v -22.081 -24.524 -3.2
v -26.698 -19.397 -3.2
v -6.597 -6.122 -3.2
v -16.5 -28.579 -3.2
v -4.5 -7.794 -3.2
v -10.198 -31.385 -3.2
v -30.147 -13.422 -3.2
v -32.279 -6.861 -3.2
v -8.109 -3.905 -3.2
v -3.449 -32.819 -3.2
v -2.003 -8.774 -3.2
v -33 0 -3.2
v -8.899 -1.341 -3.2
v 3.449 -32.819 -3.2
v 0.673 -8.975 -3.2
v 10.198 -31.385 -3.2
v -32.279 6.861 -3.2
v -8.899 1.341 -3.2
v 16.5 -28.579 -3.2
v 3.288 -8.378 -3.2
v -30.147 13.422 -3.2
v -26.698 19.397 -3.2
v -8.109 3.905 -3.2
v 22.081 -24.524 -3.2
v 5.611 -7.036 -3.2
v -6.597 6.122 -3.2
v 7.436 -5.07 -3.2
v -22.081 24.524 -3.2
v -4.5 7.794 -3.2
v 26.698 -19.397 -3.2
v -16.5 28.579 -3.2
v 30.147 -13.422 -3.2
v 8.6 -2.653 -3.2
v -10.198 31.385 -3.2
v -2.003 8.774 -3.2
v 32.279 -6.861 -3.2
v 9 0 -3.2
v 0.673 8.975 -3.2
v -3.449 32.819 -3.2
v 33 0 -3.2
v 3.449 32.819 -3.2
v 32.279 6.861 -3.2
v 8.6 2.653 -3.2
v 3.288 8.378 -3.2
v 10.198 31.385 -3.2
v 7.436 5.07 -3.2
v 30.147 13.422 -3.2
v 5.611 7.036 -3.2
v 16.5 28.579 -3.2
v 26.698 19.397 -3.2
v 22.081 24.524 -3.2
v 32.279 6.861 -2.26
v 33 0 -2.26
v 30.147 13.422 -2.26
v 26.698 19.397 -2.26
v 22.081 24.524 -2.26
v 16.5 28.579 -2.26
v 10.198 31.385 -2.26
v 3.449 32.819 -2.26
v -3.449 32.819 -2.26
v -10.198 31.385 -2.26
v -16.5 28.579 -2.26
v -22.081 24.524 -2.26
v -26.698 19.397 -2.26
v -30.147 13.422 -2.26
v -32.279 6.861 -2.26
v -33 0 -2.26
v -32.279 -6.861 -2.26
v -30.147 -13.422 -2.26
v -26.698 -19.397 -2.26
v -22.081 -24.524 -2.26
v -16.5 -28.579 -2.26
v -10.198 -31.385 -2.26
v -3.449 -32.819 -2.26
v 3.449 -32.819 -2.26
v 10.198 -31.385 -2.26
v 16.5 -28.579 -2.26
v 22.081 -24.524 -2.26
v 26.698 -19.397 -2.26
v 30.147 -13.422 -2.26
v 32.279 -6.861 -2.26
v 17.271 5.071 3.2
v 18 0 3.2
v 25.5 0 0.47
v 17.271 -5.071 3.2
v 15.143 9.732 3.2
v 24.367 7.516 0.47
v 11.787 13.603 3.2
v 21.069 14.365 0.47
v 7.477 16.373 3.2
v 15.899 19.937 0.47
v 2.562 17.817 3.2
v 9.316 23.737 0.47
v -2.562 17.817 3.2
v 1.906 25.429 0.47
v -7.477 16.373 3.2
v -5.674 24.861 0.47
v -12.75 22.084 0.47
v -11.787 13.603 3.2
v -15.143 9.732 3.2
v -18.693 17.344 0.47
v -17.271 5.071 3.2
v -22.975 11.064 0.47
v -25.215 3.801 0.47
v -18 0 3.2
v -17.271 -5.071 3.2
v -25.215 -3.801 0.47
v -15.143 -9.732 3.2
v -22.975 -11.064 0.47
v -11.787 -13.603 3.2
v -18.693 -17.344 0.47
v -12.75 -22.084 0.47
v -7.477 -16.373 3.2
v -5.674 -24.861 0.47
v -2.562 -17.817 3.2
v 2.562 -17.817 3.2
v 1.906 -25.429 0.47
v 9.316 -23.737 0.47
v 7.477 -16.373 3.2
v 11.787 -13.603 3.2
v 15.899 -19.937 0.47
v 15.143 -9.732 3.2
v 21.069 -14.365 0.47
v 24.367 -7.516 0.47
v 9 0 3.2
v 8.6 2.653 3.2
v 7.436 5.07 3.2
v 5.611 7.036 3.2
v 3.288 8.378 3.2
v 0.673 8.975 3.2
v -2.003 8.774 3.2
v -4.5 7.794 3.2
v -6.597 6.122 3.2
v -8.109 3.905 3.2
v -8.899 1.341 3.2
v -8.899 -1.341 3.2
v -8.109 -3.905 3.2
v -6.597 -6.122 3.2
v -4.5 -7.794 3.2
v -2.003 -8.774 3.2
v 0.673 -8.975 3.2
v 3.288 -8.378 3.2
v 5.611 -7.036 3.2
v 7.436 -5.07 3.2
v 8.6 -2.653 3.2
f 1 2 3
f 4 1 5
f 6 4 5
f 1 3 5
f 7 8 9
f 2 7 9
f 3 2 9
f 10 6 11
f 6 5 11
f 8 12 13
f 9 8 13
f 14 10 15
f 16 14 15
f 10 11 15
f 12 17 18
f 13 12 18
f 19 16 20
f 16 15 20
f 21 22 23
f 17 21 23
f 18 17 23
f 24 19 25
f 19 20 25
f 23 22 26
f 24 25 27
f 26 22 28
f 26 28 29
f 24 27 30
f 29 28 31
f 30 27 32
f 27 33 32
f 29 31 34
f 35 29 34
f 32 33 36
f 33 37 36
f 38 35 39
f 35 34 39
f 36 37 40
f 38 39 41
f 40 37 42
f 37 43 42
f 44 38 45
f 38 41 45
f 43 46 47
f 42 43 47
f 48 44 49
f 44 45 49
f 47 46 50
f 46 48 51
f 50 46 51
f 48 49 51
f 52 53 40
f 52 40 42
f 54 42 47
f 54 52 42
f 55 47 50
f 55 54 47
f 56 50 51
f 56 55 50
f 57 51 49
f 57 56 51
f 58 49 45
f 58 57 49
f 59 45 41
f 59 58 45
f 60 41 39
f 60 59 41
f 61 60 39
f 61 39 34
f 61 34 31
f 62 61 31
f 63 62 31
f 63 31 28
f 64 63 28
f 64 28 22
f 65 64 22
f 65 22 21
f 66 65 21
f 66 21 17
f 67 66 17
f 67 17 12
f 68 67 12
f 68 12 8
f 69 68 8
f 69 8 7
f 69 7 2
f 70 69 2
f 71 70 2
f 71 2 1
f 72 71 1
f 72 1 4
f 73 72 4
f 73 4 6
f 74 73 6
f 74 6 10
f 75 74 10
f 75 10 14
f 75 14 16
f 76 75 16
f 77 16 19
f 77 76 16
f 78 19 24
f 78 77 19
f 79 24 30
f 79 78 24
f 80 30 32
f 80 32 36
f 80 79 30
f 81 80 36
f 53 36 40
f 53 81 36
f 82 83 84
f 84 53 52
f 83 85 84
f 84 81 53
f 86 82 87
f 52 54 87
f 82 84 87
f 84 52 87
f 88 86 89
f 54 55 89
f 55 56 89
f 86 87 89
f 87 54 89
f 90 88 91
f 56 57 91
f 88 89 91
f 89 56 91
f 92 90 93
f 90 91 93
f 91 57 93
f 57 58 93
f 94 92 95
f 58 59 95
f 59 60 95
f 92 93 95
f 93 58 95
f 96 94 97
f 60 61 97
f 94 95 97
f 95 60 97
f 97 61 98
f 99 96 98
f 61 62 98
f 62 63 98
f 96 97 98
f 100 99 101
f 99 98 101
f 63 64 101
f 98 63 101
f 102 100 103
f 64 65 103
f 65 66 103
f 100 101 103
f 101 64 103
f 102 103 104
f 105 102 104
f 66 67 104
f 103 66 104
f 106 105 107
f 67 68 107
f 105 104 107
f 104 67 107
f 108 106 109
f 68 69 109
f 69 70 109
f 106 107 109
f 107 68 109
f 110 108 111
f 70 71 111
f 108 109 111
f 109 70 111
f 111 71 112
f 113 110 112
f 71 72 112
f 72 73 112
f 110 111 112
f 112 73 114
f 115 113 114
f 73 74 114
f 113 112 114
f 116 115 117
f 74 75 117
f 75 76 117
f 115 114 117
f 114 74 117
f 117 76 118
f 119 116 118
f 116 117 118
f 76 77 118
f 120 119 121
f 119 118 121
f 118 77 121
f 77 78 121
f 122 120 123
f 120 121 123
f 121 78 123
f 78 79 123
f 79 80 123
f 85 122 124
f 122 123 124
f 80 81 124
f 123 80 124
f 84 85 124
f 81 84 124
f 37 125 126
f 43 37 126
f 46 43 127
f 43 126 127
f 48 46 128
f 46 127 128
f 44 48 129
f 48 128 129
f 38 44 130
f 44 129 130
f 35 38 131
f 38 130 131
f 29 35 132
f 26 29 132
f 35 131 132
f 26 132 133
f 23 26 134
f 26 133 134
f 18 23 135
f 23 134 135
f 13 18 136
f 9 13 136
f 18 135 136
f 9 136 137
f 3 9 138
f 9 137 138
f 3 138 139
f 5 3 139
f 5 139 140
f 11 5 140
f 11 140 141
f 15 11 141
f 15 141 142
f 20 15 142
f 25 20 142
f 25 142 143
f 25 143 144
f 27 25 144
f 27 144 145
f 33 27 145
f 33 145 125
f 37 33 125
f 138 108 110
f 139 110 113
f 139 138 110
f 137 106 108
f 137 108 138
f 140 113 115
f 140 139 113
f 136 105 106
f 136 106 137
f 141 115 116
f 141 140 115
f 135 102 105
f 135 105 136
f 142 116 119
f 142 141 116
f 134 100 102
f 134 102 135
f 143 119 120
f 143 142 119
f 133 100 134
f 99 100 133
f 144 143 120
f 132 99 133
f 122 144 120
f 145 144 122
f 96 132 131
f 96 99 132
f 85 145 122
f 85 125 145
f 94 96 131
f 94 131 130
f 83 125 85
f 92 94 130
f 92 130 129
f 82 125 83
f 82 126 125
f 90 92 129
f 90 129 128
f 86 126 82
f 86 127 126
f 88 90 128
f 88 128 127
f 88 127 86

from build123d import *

# Parameters (mm, degrees)
F0_R     = 33
F1_DEPTH = 3.2
F2_R     = 9
F3_DEPTH = 6.401
F4_SIZE2 = 5.459553514
F4_SIZE  = 15


with BuildPart() as f1:
    # F0 (on Top) → F1 (new body, symmetric)
    with BuildSketch(Plane.XY):
        Circle(F0_R)
    extrude(amount=F1_DEPTH, both=True)

    # F2 (on face) → F3 (cut, through all)
    with BuildSketch(Plane.XY.offset(3.2)):
        Circle(F2_R)
    extrude(amount=-F3_DEPTH, mode=Mode.SUBTRACT)

    # F4
    f4_edges = [f1.edges().sort_by_distance(p)[0] for p in [
        (-33, 0, 3.2),
    ]]
    f4_side = f1.faces().sort_by_distance((-32.066619, 0, 3.2))[0]
    chamfer(f4_edges, length=F4_SIZE, length2=F4_SIZE2, reference=f4_side)


solid = f1.part
